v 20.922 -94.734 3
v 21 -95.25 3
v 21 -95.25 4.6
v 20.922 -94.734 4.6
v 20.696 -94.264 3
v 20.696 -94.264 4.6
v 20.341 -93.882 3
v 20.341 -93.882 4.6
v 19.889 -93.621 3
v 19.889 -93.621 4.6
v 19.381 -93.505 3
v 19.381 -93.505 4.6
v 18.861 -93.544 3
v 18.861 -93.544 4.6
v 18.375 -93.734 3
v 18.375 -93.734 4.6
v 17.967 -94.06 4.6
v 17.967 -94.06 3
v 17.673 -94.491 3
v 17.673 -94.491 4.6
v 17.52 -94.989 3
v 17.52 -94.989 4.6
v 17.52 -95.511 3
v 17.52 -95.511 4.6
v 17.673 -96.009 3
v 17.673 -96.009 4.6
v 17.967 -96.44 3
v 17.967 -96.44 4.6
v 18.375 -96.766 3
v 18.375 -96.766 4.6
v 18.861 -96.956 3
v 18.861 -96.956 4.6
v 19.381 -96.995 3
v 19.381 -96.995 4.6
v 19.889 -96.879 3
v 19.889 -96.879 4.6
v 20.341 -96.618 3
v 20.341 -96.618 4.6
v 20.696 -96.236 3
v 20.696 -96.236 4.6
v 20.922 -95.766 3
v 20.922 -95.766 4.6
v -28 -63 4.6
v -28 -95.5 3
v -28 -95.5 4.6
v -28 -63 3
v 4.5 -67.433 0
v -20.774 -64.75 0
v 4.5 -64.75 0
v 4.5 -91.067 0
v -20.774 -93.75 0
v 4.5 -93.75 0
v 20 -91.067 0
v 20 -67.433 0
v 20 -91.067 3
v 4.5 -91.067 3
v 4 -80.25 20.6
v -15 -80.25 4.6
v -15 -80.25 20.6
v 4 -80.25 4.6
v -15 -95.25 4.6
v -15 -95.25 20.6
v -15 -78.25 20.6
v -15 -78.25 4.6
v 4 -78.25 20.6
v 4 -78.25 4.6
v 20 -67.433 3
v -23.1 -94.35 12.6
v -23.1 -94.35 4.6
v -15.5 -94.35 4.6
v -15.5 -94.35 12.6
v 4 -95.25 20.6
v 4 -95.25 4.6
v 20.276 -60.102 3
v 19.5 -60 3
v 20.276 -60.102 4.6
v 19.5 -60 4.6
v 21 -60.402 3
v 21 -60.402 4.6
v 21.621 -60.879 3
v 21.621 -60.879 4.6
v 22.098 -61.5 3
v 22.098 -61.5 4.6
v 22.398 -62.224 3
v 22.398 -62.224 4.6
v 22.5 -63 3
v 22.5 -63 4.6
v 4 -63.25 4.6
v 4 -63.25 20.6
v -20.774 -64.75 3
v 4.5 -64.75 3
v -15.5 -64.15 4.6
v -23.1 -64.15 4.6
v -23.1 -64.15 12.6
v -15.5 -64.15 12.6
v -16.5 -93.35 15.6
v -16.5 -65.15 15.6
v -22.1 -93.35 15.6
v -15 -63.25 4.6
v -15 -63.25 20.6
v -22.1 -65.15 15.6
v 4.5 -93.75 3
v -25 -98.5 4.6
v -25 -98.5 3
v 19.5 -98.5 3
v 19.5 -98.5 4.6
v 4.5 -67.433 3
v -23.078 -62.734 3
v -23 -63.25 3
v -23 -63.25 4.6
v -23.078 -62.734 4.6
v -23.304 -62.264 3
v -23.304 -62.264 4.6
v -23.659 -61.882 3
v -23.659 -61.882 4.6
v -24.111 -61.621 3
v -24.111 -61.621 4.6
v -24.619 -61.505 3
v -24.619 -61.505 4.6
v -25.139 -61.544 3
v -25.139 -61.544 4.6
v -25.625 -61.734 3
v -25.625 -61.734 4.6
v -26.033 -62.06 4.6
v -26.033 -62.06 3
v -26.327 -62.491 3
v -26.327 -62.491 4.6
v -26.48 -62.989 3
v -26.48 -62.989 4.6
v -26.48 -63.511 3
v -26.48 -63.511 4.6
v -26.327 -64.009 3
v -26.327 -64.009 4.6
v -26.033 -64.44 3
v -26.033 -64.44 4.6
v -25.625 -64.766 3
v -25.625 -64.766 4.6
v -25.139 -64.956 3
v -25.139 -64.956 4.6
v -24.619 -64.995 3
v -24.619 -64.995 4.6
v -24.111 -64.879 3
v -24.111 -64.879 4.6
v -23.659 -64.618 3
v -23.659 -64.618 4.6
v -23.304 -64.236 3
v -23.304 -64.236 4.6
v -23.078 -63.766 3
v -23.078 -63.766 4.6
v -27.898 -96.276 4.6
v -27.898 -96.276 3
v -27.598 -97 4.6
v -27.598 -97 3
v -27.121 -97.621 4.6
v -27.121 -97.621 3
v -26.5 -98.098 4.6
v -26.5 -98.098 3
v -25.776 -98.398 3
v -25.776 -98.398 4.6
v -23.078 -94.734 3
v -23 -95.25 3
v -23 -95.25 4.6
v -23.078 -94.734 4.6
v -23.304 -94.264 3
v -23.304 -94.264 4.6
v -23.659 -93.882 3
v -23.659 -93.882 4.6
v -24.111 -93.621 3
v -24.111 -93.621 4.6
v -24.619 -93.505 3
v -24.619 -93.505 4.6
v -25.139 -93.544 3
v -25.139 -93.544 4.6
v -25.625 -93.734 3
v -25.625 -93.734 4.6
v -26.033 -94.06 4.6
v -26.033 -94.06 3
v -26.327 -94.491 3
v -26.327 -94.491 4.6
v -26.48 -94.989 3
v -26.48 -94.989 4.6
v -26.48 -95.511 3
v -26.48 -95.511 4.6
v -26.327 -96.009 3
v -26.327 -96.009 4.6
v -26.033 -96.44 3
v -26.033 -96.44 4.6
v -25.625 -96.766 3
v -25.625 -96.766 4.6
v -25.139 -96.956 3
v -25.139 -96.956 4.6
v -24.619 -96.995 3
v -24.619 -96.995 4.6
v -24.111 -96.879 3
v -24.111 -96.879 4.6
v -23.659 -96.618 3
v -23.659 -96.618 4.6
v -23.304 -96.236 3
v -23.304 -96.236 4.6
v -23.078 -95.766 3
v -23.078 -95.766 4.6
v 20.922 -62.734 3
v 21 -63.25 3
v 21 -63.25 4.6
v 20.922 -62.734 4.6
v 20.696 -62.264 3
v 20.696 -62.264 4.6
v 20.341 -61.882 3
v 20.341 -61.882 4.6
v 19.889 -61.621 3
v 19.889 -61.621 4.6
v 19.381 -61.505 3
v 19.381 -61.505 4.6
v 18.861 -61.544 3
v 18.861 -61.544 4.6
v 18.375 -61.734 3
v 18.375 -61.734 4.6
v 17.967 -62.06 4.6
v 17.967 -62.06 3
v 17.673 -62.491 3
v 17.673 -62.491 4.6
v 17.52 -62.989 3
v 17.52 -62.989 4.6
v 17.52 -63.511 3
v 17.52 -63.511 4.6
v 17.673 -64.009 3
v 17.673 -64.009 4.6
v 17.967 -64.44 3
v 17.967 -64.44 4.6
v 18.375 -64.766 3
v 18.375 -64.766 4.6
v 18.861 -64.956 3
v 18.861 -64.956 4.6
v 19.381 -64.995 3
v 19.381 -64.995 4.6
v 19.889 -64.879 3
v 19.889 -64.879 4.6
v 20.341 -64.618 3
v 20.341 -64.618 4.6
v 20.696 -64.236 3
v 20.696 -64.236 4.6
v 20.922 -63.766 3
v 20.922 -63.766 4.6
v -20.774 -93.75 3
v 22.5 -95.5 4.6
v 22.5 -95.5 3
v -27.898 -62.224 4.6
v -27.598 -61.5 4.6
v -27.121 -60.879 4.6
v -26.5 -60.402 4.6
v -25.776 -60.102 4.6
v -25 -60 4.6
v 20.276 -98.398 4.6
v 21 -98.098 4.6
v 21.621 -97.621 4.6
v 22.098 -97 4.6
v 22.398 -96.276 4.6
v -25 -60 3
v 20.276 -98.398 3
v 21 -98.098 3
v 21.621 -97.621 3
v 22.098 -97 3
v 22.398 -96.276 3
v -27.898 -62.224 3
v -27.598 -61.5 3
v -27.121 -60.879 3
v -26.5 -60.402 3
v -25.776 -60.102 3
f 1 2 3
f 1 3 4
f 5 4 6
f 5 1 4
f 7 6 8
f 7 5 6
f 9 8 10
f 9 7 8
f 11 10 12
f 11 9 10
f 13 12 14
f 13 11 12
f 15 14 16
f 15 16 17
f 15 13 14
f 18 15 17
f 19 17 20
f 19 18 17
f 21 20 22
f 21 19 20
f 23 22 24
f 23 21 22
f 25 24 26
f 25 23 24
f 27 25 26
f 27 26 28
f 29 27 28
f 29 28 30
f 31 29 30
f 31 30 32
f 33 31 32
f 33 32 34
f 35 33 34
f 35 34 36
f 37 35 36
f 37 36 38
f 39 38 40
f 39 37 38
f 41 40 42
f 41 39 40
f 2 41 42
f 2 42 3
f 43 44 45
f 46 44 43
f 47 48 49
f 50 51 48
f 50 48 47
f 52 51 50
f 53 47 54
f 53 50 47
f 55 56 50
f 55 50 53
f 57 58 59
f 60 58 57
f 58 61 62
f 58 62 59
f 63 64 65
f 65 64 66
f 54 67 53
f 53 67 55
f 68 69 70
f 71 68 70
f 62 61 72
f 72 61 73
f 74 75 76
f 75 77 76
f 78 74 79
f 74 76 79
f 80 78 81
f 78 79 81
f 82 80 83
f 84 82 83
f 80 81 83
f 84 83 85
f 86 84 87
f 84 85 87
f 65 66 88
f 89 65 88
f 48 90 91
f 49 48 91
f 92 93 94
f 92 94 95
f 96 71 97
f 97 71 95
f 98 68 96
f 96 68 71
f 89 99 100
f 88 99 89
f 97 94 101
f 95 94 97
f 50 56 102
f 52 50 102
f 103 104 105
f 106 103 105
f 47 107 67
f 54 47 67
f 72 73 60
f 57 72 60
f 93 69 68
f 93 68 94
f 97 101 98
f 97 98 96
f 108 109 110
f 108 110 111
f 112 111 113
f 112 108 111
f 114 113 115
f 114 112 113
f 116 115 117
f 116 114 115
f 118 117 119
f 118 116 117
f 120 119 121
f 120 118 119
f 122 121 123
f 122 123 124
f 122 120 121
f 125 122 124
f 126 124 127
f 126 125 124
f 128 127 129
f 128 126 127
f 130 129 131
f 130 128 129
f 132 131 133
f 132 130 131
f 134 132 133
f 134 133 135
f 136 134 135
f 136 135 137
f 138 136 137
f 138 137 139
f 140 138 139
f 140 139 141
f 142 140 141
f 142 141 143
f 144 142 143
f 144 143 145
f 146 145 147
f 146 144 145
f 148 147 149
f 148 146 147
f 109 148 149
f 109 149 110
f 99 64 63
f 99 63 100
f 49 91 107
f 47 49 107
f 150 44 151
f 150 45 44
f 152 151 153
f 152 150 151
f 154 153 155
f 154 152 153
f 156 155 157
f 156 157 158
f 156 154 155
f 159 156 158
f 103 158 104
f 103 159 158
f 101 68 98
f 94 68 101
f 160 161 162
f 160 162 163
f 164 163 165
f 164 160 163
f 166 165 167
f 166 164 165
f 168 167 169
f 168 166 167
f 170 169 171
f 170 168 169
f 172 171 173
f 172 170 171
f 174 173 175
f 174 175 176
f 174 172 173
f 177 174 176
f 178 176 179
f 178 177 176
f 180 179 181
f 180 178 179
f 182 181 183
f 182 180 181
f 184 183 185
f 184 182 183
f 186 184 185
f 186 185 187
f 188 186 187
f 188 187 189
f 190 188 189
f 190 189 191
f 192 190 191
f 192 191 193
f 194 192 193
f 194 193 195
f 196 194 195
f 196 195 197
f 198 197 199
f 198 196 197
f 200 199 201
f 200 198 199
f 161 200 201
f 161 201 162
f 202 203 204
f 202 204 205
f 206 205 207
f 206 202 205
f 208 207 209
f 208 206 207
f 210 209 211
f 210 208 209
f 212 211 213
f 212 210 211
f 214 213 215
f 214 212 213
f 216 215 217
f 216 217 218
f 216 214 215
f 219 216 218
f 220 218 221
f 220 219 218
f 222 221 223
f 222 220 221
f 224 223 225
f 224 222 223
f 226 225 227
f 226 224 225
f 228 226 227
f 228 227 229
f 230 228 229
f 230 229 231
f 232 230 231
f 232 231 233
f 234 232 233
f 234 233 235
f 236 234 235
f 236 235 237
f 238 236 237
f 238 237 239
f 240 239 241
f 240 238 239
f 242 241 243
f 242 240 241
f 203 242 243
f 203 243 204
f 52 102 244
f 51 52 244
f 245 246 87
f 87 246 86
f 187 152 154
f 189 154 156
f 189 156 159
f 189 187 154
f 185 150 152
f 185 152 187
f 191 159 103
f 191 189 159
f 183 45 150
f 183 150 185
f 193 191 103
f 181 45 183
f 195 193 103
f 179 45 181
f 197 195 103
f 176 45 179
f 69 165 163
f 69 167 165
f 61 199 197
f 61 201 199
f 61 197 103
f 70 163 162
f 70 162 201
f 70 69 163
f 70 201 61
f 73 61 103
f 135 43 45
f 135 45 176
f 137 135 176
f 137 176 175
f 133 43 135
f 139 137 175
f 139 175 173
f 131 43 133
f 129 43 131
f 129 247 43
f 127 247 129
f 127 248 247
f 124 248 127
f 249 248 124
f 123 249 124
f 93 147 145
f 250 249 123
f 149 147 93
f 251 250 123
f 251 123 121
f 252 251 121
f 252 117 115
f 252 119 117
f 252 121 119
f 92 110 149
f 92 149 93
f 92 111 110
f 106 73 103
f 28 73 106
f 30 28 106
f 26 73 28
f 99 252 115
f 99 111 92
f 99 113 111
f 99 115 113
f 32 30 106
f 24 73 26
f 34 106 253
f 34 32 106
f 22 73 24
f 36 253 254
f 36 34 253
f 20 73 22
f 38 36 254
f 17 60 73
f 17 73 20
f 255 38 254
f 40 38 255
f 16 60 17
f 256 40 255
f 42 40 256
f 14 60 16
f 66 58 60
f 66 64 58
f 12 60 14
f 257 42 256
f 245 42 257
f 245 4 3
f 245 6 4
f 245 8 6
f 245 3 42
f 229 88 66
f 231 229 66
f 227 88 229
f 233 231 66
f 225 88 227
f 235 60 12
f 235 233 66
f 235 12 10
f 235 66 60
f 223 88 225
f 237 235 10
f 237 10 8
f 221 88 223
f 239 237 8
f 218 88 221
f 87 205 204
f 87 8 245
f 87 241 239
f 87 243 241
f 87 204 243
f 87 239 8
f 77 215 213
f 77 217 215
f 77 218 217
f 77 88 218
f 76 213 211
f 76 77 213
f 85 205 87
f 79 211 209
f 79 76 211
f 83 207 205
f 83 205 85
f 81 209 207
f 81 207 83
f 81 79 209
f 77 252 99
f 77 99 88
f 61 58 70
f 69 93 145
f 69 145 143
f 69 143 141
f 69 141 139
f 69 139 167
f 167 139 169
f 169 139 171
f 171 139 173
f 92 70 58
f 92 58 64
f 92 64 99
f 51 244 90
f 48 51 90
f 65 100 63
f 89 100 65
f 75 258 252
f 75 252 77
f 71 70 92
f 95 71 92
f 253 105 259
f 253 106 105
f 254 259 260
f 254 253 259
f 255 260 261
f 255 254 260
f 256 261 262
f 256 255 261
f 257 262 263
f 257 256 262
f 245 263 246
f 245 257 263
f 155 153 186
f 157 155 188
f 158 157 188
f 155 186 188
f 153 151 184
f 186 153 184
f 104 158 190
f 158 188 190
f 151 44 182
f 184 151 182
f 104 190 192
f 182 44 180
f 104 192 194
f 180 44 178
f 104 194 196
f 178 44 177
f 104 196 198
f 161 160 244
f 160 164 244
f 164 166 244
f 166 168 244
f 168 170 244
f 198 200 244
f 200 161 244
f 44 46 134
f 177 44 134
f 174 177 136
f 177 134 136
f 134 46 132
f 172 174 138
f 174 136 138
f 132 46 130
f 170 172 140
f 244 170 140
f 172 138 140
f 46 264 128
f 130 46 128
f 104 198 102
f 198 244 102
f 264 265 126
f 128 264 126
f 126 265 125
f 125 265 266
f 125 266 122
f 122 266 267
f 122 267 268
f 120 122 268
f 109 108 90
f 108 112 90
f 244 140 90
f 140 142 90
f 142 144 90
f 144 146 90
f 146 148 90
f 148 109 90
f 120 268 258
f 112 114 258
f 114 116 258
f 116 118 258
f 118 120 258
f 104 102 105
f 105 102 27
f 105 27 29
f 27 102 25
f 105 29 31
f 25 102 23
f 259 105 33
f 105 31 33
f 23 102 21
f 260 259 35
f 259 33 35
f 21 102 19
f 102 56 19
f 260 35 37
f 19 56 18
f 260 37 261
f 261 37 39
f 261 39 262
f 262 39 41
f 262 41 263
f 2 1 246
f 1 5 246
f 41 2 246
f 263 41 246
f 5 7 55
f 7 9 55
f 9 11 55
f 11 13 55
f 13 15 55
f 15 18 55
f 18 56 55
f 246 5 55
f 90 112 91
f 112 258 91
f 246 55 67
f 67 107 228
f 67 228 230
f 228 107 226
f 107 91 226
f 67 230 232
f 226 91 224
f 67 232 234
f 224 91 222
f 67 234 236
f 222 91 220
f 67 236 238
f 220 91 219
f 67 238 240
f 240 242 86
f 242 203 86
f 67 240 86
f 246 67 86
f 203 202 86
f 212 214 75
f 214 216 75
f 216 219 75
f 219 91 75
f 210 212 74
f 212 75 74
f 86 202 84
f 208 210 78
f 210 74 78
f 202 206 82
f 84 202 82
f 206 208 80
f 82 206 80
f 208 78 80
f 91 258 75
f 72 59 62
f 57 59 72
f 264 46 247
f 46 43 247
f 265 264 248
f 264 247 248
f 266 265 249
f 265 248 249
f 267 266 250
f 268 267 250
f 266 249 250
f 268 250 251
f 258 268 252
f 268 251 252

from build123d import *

# Parameters (mm, degrees)
F1_START = 3
F0_W     = 50.5
F0_H     = 38.5
F0_R     = 1.75
F1_DEPTH = 1.6
F2_R     = 3
F3_W     = 15.5
F3_H     = 23.6333997347
F4_DEPTH = 3
F5_W     = 19
F5_H     = 15
F6_DEPTH = 16
F5_W_2   = 7.6
F5_H_2   = 30.2
F7_DEPTH = 11
F8_SIZE2 = 3
F8_SIZE  = 1


with BuildPart() as f1:
    # F0 (on Top) → F1 (new body)
    with BuildSketch(Plane.XY.offset(F1_START)):
        with Locations((-2.75, -79.25)):
            Rectangle(F0_W, F0_H)
        with Locations((-24.75, -95.25)):
            Circle(F0_R, mode=Mode.SUBTRACT)
        with Locations((19.25, -95.25)):
            Circle(F0_R, mode=Mode.SUBTRACT)
        with Locations((-24.75, -63.25)):
            Circle(F0_R, mode=Mode.SUBTRACT)
        with Locations((19.25, -63.25)):
            Circle(F0_R, mode=Mode.SUBTRACT)
    extrude(amount=F1_DEPTH)

    # F2
    f2_edges = [f1.edges().sort_by_distance(p)[0] for p in [
        (22.5, -98.5, 3.8),
        (22.5, -60, 3.8),
        (-28, -60, 3.8),
        (-28, -98.5, 3.8),
    ]]
    fillet(f2_edges, radius=F2_R)

    # F3 (on face) → F4 (join)
    with BuildSketch(Plane(origin=(0, 0, 3), x_dir=(1, 0, 0), z_dir=(0, 0, -1))):
        Polygon((-20.7735065699, 93.75), (-20.7735065699, 64.75), (4.5, 64.75), (4.5, 67.4333001327), (4.5, 91.0666998673), (4.5, 93.75), align=None)
        with Locations((12.25, 79.25)):
            Rectangle(F3_W, F3_H)
    extrude(amount=F4_DEPTH)

    # F5 (on face) → F6 (join)
    with BuildSketch(Plane.XY.offset(4.6)):
        with Locations((-5.5, -70.75)):
            Rectangle(F5_W, F5_H)
        with Locations((-5.5, -87.75)):
            Rectangle(F5_W, F5_H)
    extrude(amount=F6_DEPTH)

    # F5 (on face) → F7 (join)
    with BuildSketch(Plane.XY.offset(4.6)):
        with Locations((-19.3, -79.25)):
            Rectangle(F5_W_2, F5_H_2)
    extrude(amount=F7_DEPTH)

    # F8
    f8_edges = [f1.edges().sort_by_distance(p)[0] for p in [
        (-23.1, -79.25, 15.6),
        (-19.3, -64.15, 15.6),
        (-19.3, -94.35, 15.6),
        (-15.5, -79.25, 15.6),
    ]]
    f8_side = f1.faces().sort_by_distance((-19.3, -79.25, 15.6))[0]
    chamfer(f8_edges, length=F8_SIZE, length2=F8_SIZE2, reference=f8_side)


solid = f1.part
